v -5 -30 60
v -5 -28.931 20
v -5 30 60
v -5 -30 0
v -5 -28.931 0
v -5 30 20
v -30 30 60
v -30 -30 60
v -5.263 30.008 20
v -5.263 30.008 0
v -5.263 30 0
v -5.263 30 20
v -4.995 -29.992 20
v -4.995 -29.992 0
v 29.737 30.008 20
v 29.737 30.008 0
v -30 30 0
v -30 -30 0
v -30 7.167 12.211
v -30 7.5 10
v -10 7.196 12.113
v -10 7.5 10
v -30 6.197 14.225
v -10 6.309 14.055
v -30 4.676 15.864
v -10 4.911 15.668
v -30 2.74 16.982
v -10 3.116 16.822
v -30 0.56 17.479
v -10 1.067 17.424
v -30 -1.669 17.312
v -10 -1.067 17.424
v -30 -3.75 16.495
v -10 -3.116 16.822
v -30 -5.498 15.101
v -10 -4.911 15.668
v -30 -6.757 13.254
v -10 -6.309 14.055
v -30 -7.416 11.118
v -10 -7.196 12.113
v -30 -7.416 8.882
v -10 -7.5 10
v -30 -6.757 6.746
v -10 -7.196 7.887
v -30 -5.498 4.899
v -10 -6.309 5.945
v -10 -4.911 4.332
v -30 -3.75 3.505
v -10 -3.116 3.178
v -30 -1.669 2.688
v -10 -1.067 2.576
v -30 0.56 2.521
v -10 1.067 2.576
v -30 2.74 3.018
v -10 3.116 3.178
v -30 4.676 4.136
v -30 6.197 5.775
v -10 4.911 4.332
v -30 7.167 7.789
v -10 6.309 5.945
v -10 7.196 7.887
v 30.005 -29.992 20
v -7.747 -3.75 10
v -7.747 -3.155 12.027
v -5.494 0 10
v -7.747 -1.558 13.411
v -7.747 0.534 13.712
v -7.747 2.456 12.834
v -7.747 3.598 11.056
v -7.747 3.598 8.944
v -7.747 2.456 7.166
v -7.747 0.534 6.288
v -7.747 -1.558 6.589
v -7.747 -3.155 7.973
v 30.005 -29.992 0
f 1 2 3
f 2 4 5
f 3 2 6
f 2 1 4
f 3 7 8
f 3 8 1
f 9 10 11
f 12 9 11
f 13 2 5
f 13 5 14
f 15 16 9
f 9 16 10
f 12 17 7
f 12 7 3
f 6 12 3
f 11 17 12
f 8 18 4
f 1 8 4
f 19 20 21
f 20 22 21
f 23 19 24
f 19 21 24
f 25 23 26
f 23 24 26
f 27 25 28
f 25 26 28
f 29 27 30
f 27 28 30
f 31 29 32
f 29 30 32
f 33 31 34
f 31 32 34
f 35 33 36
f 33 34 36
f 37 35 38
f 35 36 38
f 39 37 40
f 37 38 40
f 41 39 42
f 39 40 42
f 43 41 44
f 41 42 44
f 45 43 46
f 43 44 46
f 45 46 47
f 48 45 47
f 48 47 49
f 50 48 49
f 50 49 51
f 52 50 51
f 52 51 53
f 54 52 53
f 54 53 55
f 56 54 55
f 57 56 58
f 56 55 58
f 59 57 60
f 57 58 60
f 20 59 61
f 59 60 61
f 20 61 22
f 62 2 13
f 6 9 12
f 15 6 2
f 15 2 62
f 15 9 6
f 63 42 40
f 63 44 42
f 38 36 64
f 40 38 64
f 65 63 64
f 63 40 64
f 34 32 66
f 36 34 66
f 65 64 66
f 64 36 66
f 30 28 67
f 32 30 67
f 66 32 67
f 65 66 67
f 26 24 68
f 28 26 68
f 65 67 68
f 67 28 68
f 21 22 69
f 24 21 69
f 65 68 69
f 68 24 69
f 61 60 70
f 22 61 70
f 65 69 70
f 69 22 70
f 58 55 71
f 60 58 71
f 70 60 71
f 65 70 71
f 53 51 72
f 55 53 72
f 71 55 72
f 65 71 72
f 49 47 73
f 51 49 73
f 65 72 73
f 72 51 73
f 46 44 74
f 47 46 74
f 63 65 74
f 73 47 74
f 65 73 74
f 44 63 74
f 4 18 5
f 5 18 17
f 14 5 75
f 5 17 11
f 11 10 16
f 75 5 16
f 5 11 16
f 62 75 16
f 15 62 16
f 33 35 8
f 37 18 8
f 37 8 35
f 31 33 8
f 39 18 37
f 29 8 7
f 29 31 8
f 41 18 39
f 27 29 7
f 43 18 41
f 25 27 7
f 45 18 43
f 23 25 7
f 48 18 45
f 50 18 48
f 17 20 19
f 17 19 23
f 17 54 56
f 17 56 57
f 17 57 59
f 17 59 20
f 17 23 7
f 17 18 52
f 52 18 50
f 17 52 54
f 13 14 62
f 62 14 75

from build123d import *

# Parameters (mm, degrees)
F0_W     = 25
F0_H     = 60
F1_DEPTH = 60
F3_DEPTH = 20
F5_D     = 15
F5_DEPTH = 20
F5_TIP   = 4.5064546427


with BuildPart() as f1:
    # F0 (on Top) → F1 (new body)
    with BuildSketch(Plane.XY):
        with Locations((-17.5, 0)):
            Rectangle(F0_W, F0_H)
    extrude(amount=F1_DEPTH)

    # F2 (on Top) → F3 (join)
    with BuildSketch(Plane.XY):
        Polygon((29.7366095148, 30.0084589422), (-5.2633904852, 30.0084589422), (-4.995259922, -29.9915410578), (30.004740078, -29.9915410578), align=None)
    extrude(amount=F3_DEPTH)

    # F5
    with Locations(Plane(origin=(-30, 0, 0), x_dir=(0, -1, 0), z_dir=(-1, 0, 0))):
        with Locations((0, 10)):
            Hole(F5_D / 2, depth=F5_DEPTH)
            with Locations((0, 0, -(F5_DEPTH + F5_TIP / 2))):  # 118° drill point
                Cone(0, F5_D / 2, F5_TIP, mode=Mode.SUBTRACT)


solid = f1.part
